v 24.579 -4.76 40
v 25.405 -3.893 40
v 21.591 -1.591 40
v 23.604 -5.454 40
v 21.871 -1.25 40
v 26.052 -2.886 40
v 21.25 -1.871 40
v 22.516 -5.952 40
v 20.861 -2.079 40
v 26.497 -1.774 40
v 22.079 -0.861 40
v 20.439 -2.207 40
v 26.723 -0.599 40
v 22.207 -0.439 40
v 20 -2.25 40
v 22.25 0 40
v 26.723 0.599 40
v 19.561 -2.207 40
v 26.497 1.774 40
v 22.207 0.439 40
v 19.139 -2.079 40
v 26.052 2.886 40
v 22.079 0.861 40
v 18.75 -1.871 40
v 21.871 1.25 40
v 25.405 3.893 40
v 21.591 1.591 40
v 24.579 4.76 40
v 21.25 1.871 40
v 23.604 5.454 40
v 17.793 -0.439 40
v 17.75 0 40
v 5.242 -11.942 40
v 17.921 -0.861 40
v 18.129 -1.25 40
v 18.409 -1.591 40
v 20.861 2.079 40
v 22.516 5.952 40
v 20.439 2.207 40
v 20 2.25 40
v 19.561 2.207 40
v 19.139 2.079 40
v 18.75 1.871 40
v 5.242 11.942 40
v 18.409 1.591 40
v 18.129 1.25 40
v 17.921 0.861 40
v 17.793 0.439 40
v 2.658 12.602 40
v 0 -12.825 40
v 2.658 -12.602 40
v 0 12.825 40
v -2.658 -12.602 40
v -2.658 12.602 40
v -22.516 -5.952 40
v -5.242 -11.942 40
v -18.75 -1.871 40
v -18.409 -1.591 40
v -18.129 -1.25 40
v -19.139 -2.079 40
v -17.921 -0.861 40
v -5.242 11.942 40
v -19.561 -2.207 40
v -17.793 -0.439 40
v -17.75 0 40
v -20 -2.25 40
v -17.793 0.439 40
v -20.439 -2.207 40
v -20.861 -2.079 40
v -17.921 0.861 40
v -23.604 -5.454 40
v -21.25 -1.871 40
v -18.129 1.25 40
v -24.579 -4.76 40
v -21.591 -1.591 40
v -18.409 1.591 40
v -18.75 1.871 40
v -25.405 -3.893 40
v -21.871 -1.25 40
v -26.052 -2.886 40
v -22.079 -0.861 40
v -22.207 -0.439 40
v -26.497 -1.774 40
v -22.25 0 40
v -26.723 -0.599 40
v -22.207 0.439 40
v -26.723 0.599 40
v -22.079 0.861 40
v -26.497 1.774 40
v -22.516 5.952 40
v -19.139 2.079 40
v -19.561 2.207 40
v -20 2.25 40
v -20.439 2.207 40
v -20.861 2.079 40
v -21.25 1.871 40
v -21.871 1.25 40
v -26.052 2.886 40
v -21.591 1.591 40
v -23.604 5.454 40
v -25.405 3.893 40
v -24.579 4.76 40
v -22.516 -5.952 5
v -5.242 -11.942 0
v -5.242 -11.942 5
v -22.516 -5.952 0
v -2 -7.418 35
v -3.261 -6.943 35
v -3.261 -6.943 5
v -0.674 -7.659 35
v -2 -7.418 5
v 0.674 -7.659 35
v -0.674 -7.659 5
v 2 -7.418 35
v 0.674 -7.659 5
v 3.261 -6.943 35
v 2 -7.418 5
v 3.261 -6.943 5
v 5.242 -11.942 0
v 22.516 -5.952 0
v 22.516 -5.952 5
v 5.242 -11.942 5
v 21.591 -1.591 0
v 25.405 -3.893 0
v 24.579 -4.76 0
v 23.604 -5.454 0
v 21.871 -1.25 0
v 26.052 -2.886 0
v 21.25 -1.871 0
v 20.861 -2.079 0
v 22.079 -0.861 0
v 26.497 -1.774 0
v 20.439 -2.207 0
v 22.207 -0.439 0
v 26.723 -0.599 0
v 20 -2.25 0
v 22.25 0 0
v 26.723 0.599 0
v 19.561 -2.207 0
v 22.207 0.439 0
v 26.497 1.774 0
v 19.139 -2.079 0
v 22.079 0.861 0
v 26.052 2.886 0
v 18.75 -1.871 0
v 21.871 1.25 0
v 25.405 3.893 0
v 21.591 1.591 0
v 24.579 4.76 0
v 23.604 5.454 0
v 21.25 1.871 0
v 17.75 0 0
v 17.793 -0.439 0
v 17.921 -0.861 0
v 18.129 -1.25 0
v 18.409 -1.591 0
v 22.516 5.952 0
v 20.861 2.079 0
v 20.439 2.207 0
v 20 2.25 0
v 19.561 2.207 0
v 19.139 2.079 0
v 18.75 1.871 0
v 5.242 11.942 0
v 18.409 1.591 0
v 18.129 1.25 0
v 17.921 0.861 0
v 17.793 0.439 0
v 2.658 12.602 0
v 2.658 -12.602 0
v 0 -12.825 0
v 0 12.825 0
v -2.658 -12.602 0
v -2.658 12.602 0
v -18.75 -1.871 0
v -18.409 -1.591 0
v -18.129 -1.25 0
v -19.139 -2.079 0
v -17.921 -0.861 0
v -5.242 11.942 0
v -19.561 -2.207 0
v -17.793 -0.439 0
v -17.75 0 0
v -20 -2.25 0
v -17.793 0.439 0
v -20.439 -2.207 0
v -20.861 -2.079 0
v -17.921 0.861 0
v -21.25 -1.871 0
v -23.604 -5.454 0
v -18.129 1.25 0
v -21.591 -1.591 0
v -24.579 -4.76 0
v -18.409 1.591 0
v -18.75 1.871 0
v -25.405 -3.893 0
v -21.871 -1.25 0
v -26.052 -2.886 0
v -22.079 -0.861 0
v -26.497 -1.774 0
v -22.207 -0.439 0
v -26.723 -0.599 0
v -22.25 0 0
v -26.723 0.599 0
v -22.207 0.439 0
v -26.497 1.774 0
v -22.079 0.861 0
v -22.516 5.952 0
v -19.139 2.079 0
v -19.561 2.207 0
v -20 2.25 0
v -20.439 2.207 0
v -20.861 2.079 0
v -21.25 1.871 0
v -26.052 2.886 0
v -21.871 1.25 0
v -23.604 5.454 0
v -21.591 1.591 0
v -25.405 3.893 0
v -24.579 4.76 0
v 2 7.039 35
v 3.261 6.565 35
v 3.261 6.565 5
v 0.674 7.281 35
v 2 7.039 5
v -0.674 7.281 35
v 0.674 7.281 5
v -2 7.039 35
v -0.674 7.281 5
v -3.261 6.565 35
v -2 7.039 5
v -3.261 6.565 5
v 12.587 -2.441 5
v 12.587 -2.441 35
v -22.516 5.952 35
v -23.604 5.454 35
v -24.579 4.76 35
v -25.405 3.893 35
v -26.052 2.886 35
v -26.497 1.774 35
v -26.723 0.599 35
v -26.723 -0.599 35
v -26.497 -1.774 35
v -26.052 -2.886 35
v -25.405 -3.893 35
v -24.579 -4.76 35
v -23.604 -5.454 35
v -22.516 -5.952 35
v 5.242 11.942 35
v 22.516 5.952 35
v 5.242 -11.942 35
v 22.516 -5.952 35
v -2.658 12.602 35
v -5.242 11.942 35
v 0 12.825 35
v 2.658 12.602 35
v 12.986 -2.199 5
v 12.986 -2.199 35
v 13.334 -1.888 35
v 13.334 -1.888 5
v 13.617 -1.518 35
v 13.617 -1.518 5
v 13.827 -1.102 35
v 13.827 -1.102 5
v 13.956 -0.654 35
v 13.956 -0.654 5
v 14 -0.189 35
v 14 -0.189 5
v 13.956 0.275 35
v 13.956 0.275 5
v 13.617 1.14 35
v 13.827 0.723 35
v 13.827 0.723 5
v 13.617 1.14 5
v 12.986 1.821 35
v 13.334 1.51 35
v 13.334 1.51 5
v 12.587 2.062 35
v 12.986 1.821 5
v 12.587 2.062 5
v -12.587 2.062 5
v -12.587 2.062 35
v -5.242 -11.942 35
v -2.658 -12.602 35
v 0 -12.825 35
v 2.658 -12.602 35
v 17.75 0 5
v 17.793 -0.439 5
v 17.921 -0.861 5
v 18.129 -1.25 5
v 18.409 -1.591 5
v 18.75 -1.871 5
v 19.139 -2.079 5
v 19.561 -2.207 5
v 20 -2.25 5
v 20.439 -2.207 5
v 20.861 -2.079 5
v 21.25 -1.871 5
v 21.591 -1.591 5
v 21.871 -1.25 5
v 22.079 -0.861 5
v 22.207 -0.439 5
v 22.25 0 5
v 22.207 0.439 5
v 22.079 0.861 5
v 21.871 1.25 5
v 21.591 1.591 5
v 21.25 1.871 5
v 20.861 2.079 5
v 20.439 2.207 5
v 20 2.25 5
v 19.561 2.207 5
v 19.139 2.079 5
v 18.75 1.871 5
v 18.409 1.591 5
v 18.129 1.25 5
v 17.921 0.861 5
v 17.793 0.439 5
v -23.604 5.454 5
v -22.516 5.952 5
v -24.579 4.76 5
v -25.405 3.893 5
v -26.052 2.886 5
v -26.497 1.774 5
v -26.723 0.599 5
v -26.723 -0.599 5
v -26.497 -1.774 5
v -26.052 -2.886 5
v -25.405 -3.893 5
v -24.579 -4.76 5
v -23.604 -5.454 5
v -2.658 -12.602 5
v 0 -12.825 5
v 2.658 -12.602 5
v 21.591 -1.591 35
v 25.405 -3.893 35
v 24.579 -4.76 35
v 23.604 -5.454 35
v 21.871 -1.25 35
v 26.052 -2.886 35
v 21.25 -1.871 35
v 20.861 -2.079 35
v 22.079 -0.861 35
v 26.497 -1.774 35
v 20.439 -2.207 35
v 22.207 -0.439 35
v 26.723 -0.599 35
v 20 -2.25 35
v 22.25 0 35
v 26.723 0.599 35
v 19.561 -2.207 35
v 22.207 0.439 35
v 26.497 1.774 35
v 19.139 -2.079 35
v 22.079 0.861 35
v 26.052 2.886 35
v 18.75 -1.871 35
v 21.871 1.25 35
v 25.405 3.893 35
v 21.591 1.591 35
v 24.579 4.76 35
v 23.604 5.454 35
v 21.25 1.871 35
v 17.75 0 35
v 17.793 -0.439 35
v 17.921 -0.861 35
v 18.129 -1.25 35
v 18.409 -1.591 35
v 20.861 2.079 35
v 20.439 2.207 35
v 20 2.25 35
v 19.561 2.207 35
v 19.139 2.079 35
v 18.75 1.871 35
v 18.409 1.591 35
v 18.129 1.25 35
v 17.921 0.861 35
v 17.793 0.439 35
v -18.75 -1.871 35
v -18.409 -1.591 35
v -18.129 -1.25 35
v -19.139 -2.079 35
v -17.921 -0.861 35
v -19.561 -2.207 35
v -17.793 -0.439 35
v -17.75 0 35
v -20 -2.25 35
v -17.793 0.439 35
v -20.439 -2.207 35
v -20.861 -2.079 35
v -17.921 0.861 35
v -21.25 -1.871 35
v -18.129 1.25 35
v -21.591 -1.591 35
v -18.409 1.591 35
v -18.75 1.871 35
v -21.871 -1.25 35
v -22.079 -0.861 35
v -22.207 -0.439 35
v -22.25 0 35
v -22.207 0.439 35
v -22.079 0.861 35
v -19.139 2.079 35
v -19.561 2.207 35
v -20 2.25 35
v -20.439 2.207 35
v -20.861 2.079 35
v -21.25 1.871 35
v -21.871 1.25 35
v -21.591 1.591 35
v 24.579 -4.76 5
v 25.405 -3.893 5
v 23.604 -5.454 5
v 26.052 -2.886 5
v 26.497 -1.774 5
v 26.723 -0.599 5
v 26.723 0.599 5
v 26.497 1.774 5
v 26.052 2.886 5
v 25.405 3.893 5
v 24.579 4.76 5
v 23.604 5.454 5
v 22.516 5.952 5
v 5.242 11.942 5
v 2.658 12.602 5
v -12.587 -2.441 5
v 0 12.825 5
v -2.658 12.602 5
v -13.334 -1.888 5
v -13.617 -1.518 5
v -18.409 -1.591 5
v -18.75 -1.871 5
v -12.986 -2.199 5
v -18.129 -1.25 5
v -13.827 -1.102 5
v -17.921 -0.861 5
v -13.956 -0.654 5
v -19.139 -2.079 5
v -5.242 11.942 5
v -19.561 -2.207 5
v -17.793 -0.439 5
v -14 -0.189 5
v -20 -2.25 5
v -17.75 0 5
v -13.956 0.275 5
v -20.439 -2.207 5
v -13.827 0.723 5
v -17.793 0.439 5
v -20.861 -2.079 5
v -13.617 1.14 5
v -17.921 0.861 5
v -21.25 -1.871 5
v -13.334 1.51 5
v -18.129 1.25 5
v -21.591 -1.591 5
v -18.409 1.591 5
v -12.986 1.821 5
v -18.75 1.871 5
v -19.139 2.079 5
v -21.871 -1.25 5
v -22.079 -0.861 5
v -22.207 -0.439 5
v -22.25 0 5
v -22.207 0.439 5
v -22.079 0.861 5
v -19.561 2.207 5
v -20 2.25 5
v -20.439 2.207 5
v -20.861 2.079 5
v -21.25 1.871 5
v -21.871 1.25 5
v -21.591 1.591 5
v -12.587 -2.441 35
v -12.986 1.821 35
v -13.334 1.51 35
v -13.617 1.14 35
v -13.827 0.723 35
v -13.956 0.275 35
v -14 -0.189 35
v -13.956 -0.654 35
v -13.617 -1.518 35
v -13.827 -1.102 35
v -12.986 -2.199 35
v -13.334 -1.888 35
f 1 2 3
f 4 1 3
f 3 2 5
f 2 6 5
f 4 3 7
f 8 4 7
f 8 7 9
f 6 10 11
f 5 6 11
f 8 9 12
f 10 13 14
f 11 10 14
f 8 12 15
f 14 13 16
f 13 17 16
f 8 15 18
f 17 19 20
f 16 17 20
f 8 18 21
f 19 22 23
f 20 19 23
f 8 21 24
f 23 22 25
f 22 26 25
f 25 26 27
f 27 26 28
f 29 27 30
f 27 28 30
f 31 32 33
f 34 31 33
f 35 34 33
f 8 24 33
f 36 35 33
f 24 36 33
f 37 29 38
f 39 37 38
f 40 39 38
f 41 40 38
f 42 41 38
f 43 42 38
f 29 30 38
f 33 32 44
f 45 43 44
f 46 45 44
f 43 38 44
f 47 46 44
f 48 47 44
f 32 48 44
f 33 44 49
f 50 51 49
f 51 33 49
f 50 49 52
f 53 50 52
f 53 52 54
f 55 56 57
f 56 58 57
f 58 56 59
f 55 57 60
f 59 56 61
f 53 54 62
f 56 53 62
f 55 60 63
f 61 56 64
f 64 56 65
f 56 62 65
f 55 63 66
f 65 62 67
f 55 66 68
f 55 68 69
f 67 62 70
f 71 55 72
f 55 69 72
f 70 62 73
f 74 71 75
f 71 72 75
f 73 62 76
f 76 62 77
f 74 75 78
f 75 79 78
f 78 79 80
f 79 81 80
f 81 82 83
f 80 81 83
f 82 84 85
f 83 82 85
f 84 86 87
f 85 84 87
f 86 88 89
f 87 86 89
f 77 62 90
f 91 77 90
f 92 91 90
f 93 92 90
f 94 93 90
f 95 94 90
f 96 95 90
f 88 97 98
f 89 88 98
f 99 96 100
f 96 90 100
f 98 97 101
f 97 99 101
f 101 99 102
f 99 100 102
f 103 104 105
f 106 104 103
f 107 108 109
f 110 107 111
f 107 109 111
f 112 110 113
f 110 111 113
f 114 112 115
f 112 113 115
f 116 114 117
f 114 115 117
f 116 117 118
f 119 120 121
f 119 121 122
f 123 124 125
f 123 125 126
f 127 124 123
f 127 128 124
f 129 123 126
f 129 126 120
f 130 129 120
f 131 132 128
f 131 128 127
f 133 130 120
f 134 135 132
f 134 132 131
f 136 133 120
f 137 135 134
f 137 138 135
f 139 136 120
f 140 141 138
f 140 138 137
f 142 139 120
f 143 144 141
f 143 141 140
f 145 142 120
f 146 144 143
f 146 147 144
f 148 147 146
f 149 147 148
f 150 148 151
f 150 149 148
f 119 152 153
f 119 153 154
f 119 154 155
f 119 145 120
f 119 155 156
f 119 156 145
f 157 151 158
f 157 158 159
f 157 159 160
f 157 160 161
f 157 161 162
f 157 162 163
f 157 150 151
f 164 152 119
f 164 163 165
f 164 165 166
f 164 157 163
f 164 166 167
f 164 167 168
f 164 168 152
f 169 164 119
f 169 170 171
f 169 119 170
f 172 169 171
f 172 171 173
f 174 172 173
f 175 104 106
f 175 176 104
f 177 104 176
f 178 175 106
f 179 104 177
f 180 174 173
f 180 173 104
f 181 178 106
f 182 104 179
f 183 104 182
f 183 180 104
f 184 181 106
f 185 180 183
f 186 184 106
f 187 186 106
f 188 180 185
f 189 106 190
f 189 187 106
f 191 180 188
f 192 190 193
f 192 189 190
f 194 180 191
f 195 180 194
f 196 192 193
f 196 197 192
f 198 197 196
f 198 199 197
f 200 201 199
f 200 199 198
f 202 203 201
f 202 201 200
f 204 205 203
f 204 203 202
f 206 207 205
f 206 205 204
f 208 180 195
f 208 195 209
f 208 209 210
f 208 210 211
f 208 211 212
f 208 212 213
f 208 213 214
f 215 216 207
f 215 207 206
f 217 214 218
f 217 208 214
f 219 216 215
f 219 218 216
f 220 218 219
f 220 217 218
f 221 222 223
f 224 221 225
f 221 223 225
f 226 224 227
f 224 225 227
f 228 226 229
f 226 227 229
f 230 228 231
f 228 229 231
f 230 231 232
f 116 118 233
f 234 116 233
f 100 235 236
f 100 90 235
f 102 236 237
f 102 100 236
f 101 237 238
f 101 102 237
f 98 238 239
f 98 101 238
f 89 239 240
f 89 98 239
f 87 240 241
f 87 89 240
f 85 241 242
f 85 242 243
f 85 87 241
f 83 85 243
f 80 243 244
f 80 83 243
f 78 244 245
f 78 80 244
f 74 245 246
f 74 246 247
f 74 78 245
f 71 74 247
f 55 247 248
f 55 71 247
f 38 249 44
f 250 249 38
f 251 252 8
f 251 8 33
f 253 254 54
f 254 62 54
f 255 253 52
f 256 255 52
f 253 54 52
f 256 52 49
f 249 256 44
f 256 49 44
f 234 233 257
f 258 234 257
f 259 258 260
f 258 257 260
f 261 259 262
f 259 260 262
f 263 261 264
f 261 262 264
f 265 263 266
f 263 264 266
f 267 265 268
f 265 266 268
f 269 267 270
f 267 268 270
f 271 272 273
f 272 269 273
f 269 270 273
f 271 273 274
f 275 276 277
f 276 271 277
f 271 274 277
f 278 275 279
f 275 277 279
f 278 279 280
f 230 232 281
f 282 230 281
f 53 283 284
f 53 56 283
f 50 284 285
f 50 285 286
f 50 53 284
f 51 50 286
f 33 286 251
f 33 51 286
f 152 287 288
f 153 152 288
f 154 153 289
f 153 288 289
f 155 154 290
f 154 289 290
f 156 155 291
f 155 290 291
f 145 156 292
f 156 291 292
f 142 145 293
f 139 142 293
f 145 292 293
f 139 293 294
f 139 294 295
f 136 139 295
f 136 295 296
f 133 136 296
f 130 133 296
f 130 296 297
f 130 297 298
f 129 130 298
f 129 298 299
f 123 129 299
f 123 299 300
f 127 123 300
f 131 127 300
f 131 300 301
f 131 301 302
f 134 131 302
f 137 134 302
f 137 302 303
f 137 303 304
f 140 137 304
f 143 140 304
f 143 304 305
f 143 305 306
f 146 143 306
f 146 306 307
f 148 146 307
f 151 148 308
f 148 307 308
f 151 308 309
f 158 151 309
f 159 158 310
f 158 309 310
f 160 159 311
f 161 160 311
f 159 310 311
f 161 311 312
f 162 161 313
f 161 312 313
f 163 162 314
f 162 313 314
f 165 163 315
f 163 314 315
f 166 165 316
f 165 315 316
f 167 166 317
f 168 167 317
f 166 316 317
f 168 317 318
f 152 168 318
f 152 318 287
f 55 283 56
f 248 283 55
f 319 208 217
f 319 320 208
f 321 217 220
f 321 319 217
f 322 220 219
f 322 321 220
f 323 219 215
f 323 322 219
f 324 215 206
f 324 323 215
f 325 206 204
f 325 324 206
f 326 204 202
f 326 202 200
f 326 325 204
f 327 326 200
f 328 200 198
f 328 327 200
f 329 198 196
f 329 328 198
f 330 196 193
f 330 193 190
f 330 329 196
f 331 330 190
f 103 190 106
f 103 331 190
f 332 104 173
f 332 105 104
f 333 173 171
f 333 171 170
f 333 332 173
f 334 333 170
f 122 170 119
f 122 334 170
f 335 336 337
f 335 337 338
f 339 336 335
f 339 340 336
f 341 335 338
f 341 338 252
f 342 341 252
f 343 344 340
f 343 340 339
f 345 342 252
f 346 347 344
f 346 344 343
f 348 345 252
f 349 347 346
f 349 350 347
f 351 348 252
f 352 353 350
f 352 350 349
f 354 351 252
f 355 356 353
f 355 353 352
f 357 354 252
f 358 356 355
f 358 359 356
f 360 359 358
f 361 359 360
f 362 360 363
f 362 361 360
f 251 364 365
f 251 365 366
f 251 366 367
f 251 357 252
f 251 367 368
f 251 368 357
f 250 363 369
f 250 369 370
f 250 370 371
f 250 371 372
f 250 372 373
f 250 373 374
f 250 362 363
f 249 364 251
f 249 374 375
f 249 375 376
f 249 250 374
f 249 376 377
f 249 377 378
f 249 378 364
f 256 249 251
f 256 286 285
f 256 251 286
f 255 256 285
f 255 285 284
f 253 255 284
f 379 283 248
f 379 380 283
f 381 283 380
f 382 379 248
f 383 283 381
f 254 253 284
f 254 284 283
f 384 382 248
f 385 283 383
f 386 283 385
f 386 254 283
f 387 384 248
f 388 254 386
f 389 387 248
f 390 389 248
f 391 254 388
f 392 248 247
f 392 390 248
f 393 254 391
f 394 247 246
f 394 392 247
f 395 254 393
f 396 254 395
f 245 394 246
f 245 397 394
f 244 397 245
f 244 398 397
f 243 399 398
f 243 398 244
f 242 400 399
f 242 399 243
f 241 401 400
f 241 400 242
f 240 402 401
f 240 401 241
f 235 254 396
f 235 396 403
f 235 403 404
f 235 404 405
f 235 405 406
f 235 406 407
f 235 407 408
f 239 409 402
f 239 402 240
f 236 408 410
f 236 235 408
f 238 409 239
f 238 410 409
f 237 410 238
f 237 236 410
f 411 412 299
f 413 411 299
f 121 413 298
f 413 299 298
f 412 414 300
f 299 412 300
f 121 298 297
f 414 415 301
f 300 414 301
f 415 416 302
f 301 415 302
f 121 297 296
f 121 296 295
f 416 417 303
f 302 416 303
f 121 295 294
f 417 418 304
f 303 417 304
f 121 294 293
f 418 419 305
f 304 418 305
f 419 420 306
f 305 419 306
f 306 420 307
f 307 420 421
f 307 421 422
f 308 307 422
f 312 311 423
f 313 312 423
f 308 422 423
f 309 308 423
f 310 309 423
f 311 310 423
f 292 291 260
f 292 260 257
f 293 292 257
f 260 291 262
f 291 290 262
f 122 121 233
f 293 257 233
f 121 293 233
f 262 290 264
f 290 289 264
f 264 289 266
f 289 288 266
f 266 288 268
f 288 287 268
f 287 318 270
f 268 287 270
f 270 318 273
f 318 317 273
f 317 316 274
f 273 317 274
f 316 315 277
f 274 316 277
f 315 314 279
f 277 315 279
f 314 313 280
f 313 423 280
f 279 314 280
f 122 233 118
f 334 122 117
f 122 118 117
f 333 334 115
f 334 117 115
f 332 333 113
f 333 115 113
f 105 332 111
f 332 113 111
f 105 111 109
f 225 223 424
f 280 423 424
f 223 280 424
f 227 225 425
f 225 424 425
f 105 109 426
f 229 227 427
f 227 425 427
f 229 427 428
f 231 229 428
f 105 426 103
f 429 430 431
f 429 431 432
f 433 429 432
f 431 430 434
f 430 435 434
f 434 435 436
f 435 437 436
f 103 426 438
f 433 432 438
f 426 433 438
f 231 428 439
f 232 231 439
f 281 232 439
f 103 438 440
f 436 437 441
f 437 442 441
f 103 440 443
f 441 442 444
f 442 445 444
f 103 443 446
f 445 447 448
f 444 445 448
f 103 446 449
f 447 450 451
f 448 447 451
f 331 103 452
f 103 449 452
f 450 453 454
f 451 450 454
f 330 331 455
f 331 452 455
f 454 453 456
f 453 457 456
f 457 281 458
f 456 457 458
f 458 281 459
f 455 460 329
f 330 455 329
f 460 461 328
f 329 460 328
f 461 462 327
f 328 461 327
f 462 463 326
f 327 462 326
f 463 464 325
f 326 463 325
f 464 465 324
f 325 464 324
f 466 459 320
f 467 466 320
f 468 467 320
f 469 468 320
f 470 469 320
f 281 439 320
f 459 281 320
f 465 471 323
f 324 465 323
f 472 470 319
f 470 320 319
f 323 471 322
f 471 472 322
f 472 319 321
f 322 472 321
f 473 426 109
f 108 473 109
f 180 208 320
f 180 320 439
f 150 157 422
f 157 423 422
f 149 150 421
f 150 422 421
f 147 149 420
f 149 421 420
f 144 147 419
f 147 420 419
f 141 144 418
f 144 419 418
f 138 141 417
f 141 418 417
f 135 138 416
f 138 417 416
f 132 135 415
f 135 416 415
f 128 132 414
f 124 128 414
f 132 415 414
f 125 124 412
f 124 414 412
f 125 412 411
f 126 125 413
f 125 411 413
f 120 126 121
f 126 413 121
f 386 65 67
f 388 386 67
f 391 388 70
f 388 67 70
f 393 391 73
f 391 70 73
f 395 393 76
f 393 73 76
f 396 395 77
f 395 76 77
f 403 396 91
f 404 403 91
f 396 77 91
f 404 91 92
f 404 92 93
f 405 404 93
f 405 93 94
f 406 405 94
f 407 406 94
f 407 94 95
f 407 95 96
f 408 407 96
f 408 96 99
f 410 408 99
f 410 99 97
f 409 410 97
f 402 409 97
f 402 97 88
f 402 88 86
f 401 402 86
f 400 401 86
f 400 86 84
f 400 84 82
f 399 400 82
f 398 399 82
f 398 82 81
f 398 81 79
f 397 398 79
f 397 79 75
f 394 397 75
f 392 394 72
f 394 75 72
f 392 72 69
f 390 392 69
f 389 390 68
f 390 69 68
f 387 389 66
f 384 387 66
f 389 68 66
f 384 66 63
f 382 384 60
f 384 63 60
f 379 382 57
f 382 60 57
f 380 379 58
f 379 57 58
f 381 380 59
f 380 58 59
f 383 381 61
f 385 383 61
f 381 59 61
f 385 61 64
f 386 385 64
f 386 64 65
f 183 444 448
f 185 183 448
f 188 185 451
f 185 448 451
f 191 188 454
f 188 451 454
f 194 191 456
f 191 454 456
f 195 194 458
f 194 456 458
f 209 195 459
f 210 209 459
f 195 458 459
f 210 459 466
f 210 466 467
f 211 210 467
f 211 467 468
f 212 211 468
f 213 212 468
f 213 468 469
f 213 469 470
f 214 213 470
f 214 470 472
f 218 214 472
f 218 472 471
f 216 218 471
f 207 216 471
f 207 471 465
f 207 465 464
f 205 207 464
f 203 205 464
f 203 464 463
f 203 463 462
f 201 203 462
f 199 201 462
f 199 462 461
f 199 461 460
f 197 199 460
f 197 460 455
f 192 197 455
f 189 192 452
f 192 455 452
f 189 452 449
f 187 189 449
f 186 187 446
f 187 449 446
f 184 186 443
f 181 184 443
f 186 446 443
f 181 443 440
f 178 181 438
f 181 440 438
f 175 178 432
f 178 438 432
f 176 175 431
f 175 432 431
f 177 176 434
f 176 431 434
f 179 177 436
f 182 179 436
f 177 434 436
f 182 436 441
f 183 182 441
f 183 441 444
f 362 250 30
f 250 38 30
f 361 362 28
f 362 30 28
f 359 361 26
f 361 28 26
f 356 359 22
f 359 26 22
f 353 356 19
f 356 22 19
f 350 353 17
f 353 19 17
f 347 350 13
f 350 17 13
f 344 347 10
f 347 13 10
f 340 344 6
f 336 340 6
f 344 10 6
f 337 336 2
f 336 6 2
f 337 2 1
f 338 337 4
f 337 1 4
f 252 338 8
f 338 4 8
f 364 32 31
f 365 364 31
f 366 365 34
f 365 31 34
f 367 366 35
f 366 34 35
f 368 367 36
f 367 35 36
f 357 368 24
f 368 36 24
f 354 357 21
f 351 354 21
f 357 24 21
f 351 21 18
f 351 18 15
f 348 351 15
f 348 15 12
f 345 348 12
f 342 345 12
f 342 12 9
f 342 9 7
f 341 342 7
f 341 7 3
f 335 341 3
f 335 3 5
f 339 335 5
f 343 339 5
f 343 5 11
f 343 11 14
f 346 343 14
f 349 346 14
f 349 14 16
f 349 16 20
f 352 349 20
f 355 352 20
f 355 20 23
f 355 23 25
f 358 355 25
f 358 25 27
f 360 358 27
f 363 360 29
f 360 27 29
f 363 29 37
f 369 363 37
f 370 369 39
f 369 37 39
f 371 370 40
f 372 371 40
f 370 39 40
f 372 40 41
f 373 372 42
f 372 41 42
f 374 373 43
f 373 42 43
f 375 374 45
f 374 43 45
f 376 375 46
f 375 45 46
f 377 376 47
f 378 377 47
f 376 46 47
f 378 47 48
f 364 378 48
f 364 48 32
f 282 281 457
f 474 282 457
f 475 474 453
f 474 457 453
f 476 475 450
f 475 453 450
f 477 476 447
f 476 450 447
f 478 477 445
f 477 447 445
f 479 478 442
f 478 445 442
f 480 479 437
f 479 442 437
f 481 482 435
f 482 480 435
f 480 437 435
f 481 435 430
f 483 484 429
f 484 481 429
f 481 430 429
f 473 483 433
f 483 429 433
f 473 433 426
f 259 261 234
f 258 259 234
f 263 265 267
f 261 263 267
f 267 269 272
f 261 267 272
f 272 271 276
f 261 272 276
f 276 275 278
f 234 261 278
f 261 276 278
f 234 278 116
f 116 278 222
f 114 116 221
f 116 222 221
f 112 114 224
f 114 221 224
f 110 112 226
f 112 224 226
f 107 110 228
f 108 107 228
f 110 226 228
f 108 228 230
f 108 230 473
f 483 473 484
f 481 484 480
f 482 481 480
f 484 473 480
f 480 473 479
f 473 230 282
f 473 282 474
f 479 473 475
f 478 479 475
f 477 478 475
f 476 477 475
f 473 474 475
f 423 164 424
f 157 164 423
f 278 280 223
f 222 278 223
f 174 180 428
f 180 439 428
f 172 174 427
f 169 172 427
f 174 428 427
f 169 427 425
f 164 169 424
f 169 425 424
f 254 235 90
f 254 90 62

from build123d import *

# Parameters (mm, degrees)
BOSS_EXTRUDE1_DEPTH = 5
FILLET1_R           = 6.3
FILLET2_R           = 6.3
FILLET3_R           = 16
FILLET4_R           = 16
SKETCH2_R           = 2.25
CUT_EXTRUDE1_DEPTH  = 31.085285873
LPATTERN3_COUNT     = 2
LPATTERN3_PITCH     = 35
BOSS_EXTRUDE2_REACH = 47.882


with BuildPart() as part:
    # Sketch1 → Boss-Extrude1 (new body)
    with BuildSketch(Plane.XY):
        Polygon((-39.682259829, 0), (0, 13.759297035), (39.682259829, 0), (0, -13.759297035), align=None)
    extrude(amount=BOSS_EXTRUDE1_DEPTH)

    # Fillet1
    fillet1_edges = [part.edges().sort_by_distance(p)[0] for p in [
        (39.682259829, 0, 2.5),
    ]]
    fillet(fillet1_edges, radius=FILLET1_R)

    # Fillet2
    fillet2_edges = [part.edges().sort_by_distance(p)[0] for p in [
        (-39.682259829, 0, 2.5),
    ]]
    fillet(fillet2_edges, radius=FILLET2_R)

    # Fillet3
    fillet3_edges = [part.edges().sort_by_distance(p)[0] for p in [
        (0, 13.759297035, 2.5),
    ]]
    fillet(fillet3_edges, radius=FILLET3_R)

    # Fillet4
    fillet4_edges = [part.edges().sort_by_distance(p)[0] for p in [
        (0, -13.759297035, 2.5),
    ]]
    fillet(fillet4_edges, radius=FILLET4_R)

    # Sketch2 → Cut-Extrude1 (cut, through all)
    with BuildSketch(Plane.XY.offset(5)):
        with Locations((-20, 0)):
            Circle(SKETCH2_R)
        with Locations(Location((20, 0, 0), (0, 0, 180))):
            Circle(SKETCH2_R)
    extrude(amount=-CUT_EXTRUDE1_DEPTH, mode=Mode.SUBTRACT)


with BuildPart() as lpattern3_1:
    # LPattern3: pattern copy
    add(part.part.moved(Location(Vector(0, 0, 1) * (1 * LPATTERN3_PITCH))))


with BuildPart() as part_1:
    add(part.part)

    # Sketch3 → Boss-Extrude2 (add, up to next)
    with BuildSketch(Plane.XY.offset(5), mode=Mode.PRIVATE) as boss_extrude2_sk1:
        with BuildLine():
            Line((-3.260869565, 6.564853587), (-12.586956522, 2.062176374))
            ThreePointArc((-12.586956522, 2.062176374), (-14, -0.189162232), (-12.586956522, -2.440500838))
            Line((-12.586956522, -2.440500838), (-3.260869565, -6.943178051))
            ThreePointArc((-3.260869565, -6.943178051), (0, -7.689162232), (3.260869565, -6.943178051))
            Line((3.260869565, -6.943178051), (12.586956522, -2.440500838))
            ThreePointArc((12.586956522, -2.440500838), (14, -0.189162232), (12.586956522, 2.062176374))
            Line((12.586956522, 2.062176374), (3.260869565, 6.564853587))
            ThreePointArc((3.260869565, 6.564853587), (0, 7.310837768), (-3.260869565, 6.564853587))
        make_face()
    boss_extrude2_tool1 = extrude(boss_extrude2_sk1.sketch, amount=BOSS_EXTRUDE2_REACH, mode=Mode.PRIVATE) - lpattern3_1.part
    add(boss_extrude2_tool1.solids().sort_by_distance((0, -0.189162, 5))[0])


solid = Compound([lpattern3_1.part, part_1.part])
